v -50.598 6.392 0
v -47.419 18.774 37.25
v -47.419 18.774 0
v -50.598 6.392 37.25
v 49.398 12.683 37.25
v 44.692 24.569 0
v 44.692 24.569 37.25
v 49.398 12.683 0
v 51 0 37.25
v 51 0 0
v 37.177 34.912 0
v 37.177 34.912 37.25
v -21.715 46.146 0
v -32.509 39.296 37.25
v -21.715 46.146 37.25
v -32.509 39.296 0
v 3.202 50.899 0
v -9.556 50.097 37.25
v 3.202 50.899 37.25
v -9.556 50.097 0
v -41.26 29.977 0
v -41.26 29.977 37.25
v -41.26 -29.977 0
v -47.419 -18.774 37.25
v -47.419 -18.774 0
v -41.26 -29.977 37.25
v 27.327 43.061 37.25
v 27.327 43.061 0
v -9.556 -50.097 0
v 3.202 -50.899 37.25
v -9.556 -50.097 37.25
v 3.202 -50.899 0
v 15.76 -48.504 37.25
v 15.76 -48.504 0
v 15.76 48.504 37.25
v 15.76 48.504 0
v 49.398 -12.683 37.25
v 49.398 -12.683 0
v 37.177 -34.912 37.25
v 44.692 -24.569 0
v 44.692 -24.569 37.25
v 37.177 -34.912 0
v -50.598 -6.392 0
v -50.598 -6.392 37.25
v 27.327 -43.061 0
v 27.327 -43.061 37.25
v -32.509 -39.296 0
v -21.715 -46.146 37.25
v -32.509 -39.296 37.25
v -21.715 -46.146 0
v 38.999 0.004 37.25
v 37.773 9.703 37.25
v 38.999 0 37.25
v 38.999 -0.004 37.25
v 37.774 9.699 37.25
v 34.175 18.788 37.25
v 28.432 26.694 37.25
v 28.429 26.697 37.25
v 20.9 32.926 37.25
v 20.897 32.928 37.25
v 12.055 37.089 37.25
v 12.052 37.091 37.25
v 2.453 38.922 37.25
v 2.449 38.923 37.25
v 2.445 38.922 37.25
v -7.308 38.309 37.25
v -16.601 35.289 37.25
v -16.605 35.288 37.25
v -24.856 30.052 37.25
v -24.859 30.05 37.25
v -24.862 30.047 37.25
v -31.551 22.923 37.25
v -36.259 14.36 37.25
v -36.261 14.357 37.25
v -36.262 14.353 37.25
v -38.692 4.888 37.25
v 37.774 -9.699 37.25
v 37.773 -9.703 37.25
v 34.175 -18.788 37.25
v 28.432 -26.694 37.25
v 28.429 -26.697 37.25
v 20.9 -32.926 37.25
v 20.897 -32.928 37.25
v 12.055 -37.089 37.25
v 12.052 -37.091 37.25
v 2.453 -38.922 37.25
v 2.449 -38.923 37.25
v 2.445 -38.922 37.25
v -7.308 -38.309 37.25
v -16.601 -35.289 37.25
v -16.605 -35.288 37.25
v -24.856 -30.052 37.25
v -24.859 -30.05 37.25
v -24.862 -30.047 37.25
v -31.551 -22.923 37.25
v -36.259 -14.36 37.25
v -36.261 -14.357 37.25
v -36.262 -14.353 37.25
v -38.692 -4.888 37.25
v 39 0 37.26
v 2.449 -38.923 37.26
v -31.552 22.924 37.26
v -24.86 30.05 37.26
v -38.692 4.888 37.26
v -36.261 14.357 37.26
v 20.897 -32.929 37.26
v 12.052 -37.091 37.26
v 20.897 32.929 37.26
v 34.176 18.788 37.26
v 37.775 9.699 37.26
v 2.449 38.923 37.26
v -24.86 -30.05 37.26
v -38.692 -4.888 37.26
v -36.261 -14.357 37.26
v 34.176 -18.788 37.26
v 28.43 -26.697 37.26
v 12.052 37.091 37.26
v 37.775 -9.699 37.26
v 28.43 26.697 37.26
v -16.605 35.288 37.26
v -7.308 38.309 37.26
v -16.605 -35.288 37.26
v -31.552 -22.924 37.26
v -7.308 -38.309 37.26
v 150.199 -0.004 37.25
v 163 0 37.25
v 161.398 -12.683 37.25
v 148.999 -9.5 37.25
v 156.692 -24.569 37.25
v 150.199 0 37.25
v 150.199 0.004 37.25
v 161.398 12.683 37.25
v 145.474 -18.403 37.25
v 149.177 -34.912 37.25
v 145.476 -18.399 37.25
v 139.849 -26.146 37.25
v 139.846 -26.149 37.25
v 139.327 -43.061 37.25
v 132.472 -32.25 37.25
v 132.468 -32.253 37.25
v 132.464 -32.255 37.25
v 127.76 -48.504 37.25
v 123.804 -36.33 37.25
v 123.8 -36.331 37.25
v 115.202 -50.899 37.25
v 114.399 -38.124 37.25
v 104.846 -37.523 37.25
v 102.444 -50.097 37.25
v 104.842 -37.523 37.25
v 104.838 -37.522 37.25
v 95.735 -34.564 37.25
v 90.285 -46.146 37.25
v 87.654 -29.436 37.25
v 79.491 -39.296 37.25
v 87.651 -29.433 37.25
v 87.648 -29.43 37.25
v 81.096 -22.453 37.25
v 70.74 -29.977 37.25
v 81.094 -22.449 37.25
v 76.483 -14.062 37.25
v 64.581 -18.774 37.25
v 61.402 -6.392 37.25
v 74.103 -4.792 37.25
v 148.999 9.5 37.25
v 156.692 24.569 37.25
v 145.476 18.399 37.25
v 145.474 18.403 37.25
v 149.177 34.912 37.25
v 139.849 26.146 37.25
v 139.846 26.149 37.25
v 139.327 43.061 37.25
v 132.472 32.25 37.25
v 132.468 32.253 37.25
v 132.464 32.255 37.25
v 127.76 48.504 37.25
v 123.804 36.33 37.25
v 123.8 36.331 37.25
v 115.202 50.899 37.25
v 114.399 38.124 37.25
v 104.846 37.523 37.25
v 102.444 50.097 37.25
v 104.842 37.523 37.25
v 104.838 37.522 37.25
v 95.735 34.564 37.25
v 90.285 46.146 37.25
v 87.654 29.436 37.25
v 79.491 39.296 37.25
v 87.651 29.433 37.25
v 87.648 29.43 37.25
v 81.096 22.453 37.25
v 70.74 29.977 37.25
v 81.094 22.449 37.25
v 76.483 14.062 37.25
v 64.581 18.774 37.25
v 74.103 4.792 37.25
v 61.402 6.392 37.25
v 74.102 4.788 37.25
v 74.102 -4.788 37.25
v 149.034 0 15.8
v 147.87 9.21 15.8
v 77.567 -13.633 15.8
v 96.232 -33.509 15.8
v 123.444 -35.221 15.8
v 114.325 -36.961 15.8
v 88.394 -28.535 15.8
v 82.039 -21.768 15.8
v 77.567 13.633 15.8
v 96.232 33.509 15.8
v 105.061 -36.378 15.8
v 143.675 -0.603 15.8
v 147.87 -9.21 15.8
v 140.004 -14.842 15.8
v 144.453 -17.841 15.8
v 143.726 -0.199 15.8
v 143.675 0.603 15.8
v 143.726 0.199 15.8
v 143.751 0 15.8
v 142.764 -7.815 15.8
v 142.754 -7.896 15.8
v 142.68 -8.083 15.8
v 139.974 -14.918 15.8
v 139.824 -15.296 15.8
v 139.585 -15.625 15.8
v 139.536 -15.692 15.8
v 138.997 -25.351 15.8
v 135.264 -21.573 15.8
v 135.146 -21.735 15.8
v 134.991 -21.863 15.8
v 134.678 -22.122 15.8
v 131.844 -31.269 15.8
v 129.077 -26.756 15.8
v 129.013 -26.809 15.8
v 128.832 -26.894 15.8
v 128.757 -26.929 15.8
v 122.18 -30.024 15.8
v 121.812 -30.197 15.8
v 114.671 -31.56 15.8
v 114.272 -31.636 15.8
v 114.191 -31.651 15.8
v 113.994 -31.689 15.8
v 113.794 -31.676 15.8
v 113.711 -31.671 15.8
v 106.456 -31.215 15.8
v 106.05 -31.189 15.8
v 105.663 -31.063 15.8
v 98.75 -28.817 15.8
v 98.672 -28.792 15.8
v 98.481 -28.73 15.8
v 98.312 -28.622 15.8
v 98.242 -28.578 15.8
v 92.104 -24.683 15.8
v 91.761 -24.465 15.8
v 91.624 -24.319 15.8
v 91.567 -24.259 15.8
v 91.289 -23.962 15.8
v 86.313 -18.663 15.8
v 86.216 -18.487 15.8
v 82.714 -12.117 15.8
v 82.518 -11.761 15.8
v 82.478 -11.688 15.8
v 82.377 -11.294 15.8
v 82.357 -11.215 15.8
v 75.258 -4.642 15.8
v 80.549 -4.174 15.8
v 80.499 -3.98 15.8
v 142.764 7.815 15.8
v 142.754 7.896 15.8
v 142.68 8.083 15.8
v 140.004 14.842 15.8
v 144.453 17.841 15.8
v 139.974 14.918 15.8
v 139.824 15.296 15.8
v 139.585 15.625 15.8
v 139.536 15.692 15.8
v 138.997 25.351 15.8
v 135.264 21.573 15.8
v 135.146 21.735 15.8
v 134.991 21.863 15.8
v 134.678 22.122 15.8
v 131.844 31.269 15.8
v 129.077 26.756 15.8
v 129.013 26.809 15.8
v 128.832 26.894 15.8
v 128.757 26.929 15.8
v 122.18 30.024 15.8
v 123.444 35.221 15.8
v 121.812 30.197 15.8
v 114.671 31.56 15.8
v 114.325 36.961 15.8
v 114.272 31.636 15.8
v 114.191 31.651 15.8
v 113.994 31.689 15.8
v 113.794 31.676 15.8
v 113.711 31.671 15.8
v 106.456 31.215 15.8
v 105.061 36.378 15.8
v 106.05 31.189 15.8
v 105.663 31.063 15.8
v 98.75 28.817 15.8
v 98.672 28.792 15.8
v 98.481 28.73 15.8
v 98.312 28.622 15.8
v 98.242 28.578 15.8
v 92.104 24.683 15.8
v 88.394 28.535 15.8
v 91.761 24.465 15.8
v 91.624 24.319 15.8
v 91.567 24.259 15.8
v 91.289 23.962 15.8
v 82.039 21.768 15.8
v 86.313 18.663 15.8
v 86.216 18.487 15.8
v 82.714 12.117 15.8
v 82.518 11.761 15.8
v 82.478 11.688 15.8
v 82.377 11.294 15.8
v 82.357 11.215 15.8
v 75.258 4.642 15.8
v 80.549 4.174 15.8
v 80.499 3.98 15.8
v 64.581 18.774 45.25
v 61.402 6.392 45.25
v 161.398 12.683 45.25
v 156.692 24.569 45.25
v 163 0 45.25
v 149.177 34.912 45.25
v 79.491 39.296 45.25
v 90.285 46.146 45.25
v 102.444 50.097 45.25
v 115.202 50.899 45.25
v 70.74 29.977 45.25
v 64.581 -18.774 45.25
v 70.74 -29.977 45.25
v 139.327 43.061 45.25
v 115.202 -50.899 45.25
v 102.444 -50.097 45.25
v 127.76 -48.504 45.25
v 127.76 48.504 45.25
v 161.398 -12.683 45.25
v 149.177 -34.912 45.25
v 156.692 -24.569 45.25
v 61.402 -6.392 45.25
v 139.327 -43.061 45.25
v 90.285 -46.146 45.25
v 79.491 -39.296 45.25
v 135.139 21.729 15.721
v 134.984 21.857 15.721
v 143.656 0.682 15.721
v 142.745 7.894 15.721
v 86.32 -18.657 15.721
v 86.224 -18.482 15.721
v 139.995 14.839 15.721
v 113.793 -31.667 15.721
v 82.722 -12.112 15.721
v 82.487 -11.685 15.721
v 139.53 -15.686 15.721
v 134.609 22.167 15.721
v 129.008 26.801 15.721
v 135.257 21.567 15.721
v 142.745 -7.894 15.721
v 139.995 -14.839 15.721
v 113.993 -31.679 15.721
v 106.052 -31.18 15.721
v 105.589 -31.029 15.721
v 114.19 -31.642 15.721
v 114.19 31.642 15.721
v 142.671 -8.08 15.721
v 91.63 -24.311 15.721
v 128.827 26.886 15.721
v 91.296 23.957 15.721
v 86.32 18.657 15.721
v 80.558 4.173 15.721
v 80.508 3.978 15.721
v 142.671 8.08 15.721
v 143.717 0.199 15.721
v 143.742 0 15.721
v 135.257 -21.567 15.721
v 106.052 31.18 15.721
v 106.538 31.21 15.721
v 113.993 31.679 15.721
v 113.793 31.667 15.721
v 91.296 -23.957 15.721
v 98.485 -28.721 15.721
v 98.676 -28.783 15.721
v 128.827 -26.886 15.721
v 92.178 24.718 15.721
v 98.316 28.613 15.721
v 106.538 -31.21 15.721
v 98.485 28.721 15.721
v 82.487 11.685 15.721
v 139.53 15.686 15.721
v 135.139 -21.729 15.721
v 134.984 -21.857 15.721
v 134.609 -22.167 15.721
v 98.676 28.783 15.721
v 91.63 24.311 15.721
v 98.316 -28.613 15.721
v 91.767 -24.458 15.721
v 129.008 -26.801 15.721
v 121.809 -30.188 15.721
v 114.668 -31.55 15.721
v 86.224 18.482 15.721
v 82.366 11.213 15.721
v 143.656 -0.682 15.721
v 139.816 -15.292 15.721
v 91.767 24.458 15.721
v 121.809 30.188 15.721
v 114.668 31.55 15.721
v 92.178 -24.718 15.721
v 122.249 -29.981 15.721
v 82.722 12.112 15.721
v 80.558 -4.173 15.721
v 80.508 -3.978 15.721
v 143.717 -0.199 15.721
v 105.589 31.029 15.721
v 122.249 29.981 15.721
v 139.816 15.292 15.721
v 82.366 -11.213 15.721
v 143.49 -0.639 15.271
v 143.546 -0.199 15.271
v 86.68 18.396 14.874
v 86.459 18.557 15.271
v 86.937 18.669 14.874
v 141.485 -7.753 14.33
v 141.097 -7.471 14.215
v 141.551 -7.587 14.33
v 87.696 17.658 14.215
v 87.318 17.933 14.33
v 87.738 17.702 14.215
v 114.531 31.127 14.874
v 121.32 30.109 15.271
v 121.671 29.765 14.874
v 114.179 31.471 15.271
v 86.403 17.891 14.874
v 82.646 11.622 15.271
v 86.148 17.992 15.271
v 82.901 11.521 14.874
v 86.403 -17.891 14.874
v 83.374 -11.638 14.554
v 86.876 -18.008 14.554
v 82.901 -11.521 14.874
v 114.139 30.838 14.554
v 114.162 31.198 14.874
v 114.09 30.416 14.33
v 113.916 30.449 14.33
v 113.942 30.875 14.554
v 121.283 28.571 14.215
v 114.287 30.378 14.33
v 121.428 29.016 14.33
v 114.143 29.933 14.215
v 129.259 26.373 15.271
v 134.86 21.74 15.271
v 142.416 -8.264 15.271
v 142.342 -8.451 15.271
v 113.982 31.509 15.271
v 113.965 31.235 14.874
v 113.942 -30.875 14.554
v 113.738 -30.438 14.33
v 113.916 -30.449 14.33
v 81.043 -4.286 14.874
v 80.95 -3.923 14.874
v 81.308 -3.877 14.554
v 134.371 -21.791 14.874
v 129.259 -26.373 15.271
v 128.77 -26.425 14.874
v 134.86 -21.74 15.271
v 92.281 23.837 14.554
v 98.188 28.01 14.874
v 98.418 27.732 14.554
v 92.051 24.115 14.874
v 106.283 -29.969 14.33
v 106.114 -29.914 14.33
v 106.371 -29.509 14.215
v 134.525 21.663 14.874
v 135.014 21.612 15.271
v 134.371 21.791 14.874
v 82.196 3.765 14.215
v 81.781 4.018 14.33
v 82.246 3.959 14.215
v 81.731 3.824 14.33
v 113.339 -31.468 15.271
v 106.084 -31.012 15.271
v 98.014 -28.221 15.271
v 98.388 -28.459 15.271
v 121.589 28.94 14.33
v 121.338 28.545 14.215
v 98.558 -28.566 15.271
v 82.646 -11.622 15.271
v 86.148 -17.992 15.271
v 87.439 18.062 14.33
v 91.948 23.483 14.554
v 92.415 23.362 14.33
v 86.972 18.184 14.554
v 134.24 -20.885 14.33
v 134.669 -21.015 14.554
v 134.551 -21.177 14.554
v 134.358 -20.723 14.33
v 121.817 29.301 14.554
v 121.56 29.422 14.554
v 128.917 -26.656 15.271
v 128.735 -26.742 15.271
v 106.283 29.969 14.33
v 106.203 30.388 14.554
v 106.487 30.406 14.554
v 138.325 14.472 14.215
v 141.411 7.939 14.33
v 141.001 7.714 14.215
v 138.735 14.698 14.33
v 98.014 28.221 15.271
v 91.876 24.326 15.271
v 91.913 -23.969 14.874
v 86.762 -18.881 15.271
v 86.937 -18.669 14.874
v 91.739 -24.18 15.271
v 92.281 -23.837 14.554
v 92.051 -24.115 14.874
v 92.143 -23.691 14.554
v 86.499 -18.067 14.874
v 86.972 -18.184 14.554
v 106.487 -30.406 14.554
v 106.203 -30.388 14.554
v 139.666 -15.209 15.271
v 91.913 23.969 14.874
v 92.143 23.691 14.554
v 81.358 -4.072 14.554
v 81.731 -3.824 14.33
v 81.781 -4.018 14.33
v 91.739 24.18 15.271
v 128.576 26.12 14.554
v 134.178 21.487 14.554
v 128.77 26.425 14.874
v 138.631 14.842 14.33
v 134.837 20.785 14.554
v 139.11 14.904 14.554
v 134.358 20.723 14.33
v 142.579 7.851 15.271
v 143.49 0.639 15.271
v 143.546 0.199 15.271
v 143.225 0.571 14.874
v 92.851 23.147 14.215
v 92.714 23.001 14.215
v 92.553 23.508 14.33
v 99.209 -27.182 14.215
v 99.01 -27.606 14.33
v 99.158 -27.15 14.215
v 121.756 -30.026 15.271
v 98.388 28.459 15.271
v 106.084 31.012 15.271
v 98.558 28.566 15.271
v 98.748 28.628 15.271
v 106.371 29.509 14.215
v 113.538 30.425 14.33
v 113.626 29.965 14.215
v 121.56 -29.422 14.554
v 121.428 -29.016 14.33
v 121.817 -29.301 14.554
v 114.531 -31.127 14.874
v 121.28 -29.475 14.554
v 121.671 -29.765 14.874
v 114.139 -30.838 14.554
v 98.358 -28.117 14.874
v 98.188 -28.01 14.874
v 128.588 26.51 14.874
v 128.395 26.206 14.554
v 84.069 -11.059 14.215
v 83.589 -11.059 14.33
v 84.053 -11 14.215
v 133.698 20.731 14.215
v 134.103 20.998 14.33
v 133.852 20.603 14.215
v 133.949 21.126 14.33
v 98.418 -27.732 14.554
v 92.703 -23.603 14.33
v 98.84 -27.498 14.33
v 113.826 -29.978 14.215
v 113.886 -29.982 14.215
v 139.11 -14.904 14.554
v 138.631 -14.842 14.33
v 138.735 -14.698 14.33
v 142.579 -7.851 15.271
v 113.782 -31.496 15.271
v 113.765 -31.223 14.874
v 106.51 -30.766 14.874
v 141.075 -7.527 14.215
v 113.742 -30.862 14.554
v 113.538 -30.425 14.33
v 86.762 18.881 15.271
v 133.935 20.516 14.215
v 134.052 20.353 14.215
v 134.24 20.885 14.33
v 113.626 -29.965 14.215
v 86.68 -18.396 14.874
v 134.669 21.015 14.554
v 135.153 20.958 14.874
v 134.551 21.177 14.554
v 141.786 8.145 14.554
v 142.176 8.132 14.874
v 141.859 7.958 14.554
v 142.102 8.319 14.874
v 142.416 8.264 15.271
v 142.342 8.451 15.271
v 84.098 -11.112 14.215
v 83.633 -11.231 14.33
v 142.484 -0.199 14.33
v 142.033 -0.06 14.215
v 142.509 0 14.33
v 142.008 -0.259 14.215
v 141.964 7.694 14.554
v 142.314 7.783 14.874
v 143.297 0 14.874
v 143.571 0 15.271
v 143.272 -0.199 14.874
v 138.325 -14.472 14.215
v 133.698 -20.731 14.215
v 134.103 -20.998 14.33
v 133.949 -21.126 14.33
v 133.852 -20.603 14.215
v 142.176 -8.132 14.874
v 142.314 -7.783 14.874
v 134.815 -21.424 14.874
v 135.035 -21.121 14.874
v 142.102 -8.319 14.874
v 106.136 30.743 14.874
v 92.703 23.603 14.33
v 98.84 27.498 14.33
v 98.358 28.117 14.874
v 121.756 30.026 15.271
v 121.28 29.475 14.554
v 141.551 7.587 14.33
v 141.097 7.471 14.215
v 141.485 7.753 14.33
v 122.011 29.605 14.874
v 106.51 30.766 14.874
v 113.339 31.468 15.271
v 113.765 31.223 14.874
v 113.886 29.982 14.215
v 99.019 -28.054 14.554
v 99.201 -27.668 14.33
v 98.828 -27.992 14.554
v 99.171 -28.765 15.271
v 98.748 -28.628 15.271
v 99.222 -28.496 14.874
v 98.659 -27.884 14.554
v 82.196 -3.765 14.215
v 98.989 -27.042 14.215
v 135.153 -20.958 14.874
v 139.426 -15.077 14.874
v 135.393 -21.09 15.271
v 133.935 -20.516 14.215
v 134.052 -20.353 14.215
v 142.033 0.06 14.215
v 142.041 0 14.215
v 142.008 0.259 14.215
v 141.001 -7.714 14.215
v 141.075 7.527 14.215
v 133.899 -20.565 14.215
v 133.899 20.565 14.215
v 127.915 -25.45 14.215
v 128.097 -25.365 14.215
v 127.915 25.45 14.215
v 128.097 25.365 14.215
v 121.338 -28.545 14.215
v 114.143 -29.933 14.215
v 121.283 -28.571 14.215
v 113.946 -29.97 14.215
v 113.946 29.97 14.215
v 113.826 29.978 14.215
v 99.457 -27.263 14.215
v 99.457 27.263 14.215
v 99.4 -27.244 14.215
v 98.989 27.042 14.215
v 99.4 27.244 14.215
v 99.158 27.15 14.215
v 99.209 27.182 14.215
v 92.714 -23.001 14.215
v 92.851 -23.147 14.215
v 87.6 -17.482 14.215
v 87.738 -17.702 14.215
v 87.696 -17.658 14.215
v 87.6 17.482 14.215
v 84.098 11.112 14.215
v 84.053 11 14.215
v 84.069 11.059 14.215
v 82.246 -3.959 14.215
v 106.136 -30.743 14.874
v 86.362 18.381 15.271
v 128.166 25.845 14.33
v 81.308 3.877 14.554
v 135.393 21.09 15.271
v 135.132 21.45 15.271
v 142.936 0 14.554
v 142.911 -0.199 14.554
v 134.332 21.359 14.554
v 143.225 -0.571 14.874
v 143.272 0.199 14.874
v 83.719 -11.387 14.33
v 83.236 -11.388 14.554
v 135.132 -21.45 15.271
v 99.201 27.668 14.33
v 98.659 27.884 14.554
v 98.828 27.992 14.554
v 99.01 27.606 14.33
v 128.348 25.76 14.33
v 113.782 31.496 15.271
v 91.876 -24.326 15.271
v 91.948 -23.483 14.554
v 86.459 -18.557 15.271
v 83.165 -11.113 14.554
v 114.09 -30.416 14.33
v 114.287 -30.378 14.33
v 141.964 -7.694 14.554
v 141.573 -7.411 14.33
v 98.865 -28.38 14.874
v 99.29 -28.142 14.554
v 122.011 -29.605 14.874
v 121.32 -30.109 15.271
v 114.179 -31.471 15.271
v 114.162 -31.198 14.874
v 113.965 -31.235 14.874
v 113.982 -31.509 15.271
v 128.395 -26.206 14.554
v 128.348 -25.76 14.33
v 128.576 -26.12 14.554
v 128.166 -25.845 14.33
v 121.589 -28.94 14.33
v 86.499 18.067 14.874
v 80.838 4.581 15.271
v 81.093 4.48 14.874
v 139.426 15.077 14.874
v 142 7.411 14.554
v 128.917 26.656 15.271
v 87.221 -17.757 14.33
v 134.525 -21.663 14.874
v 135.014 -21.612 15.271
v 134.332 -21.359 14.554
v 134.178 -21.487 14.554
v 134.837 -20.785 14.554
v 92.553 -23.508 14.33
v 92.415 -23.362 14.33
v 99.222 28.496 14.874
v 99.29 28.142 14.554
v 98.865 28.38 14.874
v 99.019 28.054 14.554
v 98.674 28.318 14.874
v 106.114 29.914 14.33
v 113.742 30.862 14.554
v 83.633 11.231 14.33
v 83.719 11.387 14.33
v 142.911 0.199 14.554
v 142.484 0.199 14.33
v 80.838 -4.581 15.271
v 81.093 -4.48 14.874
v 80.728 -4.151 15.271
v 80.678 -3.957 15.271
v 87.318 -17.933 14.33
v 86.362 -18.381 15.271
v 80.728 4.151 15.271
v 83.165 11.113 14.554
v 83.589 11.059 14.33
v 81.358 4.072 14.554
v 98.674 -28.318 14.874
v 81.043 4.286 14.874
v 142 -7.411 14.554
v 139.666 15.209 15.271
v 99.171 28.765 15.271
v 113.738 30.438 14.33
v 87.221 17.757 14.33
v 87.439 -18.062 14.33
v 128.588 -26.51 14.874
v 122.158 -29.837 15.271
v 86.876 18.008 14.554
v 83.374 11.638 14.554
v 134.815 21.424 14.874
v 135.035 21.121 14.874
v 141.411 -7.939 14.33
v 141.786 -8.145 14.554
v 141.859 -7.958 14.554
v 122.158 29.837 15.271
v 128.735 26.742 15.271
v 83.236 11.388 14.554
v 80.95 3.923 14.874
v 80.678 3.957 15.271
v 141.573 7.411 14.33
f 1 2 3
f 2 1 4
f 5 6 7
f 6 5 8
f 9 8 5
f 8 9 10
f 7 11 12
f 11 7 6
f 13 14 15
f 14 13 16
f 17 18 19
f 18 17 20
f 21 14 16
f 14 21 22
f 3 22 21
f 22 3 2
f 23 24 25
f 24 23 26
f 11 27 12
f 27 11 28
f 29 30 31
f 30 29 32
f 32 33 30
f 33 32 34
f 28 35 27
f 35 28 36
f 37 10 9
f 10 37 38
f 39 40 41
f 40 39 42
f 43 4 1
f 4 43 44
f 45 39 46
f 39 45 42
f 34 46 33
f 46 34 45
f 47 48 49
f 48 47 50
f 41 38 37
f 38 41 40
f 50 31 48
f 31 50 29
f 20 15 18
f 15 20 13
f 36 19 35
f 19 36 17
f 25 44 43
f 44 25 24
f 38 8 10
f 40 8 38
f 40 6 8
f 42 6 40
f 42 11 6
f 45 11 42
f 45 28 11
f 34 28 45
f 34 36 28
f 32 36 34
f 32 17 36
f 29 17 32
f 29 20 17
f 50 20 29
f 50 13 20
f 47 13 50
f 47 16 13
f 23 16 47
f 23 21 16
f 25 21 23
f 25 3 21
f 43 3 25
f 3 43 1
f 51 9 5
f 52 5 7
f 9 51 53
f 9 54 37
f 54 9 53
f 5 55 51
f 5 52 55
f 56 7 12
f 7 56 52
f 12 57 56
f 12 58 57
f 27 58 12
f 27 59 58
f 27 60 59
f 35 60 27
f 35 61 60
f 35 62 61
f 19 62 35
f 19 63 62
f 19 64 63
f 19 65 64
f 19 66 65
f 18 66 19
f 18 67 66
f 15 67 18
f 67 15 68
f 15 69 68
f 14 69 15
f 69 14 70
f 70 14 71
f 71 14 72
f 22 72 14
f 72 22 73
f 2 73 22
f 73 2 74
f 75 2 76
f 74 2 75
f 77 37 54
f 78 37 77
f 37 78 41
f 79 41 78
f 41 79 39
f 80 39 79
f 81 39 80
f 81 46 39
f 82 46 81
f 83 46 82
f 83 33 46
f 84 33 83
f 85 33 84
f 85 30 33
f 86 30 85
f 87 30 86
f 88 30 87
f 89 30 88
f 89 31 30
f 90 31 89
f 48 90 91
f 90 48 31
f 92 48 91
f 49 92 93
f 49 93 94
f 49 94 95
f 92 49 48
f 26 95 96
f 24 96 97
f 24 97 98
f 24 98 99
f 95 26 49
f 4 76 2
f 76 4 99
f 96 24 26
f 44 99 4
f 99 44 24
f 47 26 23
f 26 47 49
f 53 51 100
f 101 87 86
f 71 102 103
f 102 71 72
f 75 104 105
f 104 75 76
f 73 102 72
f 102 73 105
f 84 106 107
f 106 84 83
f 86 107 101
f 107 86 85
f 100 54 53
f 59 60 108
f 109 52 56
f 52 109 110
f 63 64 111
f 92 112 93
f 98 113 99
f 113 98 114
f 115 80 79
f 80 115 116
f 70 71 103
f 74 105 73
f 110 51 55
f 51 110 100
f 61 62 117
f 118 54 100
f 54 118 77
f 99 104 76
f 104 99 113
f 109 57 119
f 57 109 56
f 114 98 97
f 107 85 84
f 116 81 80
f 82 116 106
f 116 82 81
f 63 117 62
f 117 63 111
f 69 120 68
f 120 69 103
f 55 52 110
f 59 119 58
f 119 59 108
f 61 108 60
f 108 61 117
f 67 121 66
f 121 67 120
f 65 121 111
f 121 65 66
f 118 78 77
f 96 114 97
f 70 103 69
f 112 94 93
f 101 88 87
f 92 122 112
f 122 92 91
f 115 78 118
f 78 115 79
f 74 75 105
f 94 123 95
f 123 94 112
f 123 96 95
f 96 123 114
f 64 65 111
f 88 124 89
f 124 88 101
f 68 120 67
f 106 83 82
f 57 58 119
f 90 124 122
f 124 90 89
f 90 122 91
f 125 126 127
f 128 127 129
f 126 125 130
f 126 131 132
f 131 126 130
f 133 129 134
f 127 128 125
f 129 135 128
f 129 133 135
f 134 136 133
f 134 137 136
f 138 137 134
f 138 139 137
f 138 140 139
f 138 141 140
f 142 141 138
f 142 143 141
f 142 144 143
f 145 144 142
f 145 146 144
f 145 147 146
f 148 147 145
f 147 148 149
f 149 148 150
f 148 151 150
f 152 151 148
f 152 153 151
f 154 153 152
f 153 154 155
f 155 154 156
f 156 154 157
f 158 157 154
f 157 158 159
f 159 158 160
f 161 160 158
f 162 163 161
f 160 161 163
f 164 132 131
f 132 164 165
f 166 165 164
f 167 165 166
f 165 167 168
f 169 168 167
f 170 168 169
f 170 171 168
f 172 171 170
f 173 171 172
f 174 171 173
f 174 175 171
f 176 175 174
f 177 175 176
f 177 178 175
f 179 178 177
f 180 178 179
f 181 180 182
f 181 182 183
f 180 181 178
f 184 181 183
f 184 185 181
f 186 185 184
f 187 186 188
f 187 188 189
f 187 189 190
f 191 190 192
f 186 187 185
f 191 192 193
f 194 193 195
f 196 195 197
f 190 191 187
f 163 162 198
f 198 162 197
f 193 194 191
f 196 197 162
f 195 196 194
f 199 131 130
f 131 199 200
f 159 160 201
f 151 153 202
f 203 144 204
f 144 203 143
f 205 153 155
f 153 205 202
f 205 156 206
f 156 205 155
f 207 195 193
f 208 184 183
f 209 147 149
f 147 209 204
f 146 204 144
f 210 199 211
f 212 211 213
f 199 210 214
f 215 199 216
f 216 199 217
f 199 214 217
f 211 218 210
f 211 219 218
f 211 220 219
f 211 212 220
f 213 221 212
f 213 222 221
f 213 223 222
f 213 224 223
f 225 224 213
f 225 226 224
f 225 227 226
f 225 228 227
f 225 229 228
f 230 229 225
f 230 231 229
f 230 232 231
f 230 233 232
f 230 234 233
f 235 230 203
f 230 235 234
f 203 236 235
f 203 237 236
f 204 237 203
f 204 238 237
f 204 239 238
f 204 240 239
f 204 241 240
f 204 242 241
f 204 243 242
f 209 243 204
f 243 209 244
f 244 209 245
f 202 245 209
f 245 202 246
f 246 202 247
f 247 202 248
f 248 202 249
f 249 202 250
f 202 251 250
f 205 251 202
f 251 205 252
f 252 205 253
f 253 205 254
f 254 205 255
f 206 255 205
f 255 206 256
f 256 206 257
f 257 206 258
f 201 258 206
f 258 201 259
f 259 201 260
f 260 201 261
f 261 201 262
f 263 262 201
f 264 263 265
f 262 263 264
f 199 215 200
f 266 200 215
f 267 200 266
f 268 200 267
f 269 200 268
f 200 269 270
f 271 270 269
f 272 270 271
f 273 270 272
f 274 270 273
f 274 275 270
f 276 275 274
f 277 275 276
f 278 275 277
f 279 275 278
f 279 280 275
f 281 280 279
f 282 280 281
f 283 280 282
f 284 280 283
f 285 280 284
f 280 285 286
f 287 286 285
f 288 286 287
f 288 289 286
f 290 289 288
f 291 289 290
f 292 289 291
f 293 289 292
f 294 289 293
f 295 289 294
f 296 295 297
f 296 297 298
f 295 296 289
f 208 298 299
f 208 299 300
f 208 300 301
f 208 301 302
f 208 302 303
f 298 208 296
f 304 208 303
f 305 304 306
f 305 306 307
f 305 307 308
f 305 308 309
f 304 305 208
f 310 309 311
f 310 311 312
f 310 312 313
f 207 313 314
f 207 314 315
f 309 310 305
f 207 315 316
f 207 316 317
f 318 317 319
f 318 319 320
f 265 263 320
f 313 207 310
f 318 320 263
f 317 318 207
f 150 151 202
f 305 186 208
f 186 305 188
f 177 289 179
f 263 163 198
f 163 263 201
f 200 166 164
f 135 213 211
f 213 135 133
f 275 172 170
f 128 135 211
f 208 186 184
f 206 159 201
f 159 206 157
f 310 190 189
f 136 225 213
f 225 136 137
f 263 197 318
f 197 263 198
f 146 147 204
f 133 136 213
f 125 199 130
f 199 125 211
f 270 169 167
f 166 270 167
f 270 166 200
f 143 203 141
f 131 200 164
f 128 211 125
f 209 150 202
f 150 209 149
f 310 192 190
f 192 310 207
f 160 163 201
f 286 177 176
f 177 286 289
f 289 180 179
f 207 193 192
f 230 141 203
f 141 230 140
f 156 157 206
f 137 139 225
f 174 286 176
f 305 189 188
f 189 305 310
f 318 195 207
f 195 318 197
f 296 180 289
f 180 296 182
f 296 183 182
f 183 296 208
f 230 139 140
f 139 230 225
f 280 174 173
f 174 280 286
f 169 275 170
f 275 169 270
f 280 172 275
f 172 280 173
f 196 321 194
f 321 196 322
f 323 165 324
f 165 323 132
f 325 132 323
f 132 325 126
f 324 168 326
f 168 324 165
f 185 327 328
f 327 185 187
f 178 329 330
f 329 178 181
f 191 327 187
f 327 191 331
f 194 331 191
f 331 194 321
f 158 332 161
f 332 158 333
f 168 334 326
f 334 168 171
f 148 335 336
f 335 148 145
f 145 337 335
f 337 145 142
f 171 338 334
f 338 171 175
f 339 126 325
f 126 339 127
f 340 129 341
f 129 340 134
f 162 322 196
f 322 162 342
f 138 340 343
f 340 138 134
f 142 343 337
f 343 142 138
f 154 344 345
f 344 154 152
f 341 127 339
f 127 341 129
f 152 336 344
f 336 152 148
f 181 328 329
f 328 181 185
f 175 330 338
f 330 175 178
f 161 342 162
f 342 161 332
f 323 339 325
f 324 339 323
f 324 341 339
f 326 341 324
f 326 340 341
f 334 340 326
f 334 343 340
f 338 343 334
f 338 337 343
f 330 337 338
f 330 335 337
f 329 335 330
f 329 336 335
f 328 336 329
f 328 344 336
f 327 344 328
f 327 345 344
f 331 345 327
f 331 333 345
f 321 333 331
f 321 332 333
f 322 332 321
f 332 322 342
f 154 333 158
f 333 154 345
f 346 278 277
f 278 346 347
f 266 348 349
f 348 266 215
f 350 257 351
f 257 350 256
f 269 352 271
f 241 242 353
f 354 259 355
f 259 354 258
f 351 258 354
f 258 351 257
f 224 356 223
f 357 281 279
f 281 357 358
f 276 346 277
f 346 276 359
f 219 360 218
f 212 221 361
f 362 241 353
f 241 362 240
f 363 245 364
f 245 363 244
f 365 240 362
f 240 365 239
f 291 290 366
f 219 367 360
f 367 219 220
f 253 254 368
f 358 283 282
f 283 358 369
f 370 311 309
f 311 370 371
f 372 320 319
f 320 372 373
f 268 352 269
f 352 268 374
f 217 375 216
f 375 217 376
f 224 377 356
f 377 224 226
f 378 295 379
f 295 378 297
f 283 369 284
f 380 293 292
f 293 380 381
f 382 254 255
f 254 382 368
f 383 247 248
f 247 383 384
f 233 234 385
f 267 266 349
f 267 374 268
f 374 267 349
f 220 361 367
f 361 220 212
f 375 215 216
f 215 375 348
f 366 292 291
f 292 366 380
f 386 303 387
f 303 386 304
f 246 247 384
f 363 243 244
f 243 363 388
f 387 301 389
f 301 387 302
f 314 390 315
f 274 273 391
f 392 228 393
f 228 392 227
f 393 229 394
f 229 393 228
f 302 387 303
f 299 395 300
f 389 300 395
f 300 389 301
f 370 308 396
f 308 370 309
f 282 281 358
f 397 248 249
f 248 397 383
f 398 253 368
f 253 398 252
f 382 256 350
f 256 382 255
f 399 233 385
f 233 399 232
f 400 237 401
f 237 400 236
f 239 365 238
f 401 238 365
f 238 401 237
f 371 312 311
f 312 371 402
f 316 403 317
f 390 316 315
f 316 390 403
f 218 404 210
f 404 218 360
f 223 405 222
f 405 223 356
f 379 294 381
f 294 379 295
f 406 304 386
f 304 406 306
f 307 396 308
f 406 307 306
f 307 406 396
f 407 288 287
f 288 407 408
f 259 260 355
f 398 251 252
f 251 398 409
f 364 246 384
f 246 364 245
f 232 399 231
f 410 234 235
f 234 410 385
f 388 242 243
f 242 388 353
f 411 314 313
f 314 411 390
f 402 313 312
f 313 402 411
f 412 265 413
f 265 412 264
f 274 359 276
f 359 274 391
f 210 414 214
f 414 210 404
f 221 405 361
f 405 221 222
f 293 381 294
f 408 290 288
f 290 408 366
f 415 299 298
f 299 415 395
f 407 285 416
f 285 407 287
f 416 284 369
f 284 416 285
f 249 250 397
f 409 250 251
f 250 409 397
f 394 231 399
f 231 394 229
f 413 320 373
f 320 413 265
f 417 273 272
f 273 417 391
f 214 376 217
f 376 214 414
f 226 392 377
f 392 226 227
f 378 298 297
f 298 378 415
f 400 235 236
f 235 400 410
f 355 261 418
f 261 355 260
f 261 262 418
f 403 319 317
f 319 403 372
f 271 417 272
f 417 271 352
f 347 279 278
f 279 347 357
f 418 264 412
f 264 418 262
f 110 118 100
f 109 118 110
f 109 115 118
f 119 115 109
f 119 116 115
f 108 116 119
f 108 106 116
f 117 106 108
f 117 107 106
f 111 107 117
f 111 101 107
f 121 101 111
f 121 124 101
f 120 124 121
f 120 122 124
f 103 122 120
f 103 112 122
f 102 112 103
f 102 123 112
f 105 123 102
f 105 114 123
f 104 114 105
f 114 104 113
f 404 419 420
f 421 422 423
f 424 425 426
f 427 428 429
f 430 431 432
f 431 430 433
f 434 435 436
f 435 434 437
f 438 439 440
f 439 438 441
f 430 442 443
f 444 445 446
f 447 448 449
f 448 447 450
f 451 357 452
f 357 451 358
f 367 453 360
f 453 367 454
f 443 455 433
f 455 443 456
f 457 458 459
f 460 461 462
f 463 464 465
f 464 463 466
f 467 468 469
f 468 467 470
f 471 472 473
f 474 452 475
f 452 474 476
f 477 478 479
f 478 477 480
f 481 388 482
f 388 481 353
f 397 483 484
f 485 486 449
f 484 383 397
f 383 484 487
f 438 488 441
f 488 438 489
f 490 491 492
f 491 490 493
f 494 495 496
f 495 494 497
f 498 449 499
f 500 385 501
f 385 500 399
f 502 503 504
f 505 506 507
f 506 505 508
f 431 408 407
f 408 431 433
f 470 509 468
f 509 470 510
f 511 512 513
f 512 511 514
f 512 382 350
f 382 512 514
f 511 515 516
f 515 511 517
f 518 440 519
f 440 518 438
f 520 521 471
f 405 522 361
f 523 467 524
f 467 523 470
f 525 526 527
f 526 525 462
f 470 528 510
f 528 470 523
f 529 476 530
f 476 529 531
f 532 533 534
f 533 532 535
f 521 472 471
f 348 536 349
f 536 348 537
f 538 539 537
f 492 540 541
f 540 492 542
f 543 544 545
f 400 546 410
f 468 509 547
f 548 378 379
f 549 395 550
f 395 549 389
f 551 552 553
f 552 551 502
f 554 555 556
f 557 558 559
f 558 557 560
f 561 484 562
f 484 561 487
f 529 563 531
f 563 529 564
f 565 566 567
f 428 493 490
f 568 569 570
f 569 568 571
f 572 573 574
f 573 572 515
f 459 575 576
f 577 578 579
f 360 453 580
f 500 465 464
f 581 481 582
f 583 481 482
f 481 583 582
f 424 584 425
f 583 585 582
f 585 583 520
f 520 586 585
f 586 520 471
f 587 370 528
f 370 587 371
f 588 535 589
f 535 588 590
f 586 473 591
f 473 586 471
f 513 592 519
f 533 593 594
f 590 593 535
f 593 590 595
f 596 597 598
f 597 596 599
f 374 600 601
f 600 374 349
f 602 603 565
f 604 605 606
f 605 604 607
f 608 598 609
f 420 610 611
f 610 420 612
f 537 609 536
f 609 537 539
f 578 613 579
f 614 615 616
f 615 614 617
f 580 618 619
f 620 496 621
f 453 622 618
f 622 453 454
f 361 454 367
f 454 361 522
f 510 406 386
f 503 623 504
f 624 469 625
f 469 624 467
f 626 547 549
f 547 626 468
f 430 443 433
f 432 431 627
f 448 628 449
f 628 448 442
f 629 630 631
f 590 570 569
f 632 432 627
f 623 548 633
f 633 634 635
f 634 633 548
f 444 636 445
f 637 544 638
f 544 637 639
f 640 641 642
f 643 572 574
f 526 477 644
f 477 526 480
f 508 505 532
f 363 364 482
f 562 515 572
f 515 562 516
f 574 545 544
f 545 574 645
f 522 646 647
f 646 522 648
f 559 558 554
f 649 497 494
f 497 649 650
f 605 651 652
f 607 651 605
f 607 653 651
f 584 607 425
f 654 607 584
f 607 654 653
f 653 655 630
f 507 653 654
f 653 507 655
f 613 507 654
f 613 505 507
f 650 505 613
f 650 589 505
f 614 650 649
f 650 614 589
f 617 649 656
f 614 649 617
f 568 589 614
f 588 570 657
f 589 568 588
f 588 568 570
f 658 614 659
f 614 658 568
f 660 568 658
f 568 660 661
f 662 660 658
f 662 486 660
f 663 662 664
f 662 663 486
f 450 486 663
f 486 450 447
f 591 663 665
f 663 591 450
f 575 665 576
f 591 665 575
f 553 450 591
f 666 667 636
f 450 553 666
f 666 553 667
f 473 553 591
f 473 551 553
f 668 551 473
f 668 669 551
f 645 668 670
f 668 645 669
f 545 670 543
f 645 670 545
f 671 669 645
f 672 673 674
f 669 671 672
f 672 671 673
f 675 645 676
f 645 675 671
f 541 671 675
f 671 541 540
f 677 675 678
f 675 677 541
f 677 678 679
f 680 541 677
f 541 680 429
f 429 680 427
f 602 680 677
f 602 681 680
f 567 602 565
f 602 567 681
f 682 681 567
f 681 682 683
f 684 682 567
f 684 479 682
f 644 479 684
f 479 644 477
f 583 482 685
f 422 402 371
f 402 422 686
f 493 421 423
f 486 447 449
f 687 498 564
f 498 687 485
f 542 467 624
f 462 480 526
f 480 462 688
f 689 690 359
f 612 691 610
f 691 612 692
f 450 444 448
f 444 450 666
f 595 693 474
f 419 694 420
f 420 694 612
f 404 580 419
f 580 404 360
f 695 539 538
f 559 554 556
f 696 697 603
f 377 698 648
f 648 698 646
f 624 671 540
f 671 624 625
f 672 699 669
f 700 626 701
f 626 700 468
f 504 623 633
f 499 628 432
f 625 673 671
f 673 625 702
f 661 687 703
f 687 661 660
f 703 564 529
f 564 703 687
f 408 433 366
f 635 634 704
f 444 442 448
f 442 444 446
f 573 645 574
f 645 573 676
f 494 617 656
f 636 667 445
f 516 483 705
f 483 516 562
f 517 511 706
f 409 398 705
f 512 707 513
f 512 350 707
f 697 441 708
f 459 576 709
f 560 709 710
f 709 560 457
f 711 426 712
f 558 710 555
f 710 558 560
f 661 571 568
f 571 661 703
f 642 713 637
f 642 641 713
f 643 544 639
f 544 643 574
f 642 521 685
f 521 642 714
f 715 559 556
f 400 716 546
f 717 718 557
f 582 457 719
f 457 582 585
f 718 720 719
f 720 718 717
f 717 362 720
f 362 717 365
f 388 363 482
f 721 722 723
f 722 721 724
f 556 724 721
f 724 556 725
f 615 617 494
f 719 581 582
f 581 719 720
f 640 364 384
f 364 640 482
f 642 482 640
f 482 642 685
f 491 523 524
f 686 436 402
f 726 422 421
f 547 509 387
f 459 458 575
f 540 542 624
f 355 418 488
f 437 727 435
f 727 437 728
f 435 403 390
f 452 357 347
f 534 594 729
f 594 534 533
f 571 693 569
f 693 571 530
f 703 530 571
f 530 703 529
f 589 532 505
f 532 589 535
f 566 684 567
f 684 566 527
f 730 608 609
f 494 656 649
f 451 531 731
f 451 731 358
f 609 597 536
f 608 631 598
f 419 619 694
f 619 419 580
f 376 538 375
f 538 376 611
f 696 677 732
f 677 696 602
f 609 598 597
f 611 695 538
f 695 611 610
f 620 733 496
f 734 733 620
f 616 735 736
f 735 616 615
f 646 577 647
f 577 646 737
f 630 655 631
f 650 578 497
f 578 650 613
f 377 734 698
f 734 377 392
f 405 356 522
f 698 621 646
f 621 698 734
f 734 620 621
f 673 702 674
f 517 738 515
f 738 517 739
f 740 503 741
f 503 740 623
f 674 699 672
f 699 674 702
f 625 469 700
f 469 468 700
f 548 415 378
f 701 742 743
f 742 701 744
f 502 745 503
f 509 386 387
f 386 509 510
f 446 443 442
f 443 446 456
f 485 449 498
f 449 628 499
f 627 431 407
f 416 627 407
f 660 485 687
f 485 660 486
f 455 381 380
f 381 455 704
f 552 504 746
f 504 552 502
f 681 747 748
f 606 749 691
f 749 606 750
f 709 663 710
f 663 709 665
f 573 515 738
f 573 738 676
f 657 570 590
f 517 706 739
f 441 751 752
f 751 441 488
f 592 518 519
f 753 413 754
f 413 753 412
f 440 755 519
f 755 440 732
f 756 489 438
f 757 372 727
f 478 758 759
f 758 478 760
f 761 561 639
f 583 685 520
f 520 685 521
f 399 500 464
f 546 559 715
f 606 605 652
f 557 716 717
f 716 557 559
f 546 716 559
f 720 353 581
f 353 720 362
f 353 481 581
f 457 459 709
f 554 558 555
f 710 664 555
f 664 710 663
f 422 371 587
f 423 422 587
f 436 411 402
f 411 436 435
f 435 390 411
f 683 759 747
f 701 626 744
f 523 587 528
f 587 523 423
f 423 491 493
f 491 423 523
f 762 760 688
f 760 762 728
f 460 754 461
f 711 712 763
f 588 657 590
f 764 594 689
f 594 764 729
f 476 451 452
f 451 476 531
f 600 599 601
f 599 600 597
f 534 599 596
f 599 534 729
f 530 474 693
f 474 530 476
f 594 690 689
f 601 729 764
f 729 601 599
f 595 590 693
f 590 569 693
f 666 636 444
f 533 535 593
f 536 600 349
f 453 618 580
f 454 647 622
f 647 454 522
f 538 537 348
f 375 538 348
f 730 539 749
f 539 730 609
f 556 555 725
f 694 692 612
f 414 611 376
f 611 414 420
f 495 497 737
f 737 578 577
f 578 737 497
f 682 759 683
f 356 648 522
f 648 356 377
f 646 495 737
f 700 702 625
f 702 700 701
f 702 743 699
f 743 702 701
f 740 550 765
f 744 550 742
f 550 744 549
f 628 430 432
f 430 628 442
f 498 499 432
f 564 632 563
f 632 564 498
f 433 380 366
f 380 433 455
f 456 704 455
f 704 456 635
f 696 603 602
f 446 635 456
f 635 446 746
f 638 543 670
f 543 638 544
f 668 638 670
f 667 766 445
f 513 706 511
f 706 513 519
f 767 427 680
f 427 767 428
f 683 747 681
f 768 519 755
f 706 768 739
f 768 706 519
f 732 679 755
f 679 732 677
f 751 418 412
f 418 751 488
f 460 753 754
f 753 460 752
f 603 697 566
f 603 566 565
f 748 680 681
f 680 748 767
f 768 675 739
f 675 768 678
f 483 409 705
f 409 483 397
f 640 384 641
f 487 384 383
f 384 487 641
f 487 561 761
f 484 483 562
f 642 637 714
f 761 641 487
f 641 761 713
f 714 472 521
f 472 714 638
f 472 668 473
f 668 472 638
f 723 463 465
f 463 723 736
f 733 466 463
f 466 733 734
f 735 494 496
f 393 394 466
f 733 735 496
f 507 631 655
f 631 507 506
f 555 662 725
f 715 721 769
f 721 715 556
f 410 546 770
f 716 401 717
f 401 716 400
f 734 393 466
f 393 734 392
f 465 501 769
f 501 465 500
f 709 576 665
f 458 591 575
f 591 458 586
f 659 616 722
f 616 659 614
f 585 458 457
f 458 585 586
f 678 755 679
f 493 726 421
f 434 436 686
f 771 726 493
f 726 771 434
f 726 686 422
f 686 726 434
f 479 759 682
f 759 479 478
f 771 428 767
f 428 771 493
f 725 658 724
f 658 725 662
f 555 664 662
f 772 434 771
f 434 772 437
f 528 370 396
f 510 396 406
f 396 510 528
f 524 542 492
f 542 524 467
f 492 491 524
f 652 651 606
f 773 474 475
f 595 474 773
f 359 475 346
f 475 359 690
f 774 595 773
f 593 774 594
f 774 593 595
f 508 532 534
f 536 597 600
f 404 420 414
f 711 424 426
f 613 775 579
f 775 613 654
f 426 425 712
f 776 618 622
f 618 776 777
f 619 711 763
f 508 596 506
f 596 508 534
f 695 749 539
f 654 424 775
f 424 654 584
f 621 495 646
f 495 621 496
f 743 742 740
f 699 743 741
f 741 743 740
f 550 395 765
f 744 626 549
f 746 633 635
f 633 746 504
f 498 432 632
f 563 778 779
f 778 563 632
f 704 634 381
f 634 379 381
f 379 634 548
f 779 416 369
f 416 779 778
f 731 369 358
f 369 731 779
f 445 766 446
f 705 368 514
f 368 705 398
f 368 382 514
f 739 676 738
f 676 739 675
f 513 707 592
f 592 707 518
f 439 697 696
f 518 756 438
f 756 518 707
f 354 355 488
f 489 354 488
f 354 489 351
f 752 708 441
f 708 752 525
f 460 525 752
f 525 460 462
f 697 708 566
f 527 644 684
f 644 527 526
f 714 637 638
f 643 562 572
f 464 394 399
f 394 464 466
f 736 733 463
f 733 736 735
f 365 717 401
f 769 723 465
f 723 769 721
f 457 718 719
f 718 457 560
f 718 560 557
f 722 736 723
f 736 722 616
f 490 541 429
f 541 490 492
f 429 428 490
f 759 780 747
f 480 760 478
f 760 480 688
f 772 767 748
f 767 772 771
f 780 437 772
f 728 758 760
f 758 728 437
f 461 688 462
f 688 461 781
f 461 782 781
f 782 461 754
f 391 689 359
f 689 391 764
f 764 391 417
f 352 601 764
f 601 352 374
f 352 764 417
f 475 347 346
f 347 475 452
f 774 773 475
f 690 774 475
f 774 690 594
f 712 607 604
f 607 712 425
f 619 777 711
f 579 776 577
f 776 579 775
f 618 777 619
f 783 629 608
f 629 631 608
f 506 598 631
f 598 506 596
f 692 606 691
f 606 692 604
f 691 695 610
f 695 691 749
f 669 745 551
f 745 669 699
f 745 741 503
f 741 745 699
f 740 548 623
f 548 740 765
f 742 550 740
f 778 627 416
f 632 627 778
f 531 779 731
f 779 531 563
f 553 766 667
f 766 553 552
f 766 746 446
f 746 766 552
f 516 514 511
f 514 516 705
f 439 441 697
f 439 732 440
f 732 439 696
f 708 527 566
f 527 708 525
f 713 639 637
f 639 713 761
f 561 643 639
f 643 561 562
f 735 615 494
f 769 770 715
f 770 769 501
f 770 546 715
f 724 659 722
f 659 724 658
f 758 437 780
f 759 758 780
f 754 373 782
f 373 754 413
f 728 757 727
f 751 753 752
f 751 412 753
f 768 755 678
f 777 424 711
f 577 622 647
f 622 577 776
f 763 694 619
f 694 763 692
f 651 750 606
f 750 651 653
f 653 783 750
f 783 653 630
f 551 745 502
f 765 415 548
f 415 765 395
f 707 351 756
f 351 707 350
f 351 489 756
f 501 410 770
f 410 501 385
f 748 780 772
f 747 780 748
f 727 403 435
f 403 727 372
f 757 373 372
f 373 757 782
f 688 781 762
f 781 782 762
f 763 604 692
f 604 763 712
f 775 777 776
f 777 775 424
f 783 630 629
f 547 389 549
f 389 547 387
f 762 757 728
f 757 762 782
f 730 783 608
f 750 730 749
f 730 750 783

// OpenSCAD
// file: common.scad
// Easy Button style case for the rev1 single-button board. All white.
//
// Three printable parts: base, button, clamp.
// Origin is the PCB center. +Y is USB. +Z is the button face.
// z = 0 is the outside of the base floor.
//
// OBJ mesh units are 0.254 mm. The PCB is about 40.5 x 43.9 mm and its
// corners sit at r ≈ 28.3 mm. The switch is dead center. The XIAO is on
// the back at the USB end (about y = 2 to 23).
//
// The cell's long side runs along X, same direction as the PCB width.
// outer_r is 32. The board, module, and battery are shifted toward USB
// only as far as that circle allows. The USB cut is a tunnel out through
// the wall.

// Body
outer_r = 31;
// Board and module, toward USB from the switch. The USB end needs wall left.
stack_y = 6;
floor_t = 1.5;
pcb_t = 1.6;
pcb_gap = 0.45;

// Battery
// 38 mm across the PCB width, 25 mm toward the tail of the board, plus wiggle.
battery_x = 38.0;
battery_y = 25.1;
battery_top = -0.01;    // Slight overlap to eliminate the wall between the battery and the module
battery_d = 8;     // under the PCB; 8 mm cell plus clearance

// XIAO
xiao_w = 20;
xiao_body_y0 = 0;
xiao_body_y1 = 22.4;
xiao_usb_w = 12.0;
xiao_usb_y1 = 23.3;
xiao_d = 3.5;

// Button
switch_h = 1.8;
tip_gap = 0.35;
tip_d = 4;
tip_straight = 1.6;
travel = 1.0;
flange_r = 26.0;
flange_t = 1.25;
face_r = 23.0;
face_h = 3.4;         // flat top, stands proud of the clamp lip
opening_r = 23.15;     // clamp hole the face passes through

// Clamp
lip_t = 1.8;
screw_r = 27;      // head stays inside outer_r, shaft stays outside the flange
screw_angles = [-210, 270, -330];
screw_clear_d = 3.3;
screw_pilot_d = 3;
screw_pilot_h = 8.0;
screw_head_d = 5.4;
screw_head_h = 1.5;

// USB
// Tunnel from the connector (inside the circle) out through the wall.
usb_w = 10.0;
usb_h = 5.0;
usb_drop = 2.35;
usb_y0 = 12;

eps = 0.05;

// --- derived ---
pcb_z = floor_t + battery_d;
pcb_top = pcb_z + pcb_t;
switch_top = pcb_top + switch_h;
tip_rest = switch_top + tip_gap;
seat_z = tip_rest - travel;
lip_z = flange_t + travel;                 // lip underside, relative to the clamp bottom
clamp_h = lip_z + lip_t;
flange_clear_r = flange_r + 0.55;

board_pts = [
  [-17.78, -21.95],
  [ 17.91, -21.95],
  [ 20.23, -19.55],
  [ 20.18,  10.67],
  [  8.89,  21.95],
  [ -9.02,  21.95],
  [-20.23,  10.67],
  [-20.15, -19.55]
];

module board_2d() {
  translate([0, stack_y])
    polygon(board_pts);
}

module battery_2d() {
  // +Y edge sits battery_top below the module.
  translate([0, stack_y - battery_top - battery_y / 2])
    square([battery_x, battery_y], center = true);
}

module xiao_2d() {
  translate([0, stack_y]) {
    translate([0, (xiao_body_y0 + xiao_body_y1) / 2])
      square([xiao_w, xiao_body_y1 - xiao_body_y0], center = true);
    translate([0, (xiao_body_y1 - 1.2 + xiao_usb_y1) / 2])
      square([xiao_usb_w, xiao_usb_y1 - (xiao_body_y1 - 1.2)], center = true);
  }
}

module base() {
  difference() {
    base_body();
    translate([0, 0, floor_t])
      linear_extrude(battery_d + eps + 10) //extrude all the way out
        battery_2d();
    translate([0, 0, pcb_z - xiao_d])
      linear_extrude(xiao_d + eps)
        xiao_2d();
    translate([0, 0, pcb_z])
      linear_extrude(seat_z - pcb_z + eps)
        offset(delta = pcb_gap) board_2d();
    usb_tunnel();
    wire_notch();
    screw_pilots();
  }
  pcb_tabs();
}

// Press the board past these. They keep it from falling out when the cap is off.
module pcb_tabs() {
  z0 = pcb_top + 0.35;
  h = 0.75;
  translate([-21.6, stack_y - 5, z0]) cube([1.8, 10, h]);
  translate([19.8, stack_y - 5, z0]) cube([1.8, 10, h]);
}

module usb_tunnel() {
  cz = pcb_z - usb_drop;
  translate([-usb_w / 2, usb_y0 + stack_y, cz - usb_h / 2])
    cube([usb_w, outer_r - (usb_y0 + stack_y) + 2, usb_h]);
}

module wire_notch() {
  translate([13, stack_y - 3, pcb_z - 8])
    cube([6, 15, 8 + eps]);
}

module screw_pilots() {
  for (a = screw_angles)
    rotate([0, 0, a])
      translate([screw_r, 0, seat_z - screw_pilot_h])
        cylinder(d = screw_pilot_d, h = screw_pilot_h + eps);
}

// Outer wall. The bottom edge is a quarter-round of radius rad.
module base_body() {
  rad = 2;
  minkowski() {
    translate([0, 0, rad])
      cylinder(r = outer_r - rad, h = seat_z - rad);
    difference() {
      sphere(r = rad);
      translate([-rad * 2, -rad * 2, 0])
        cube([rad * 4, rad * 4, rad * 2]);
    }
  }
}

module clamp() {
  difference() {
    union() {
      cylinder(r = outer_r, h = clamp_h);
    }
    // Below the lip the flange has to move.
    translate([0, 0, -eps])
      difference() {
        cylinder(r = flange_clear_r, h = lip_z + eps);
        // Cut out alignment pin so it doesnt difference
        for (a = screw_angles)
          rotate([0, 0, a])
            translate([screw_r, 0, 0]) {
              translate([0, 0, -eps])
                cylinder(d = screw_clear_d+4, h = clamp_h);
            }
      }
    // Opening the face comes through.
    translate([0, 0, lip_z - eps])
      cylinder(r = opening_r, h = lip_t + 2 * eps);
    screw_clearance();
  }
}

module screw_clearance() {
  for (a = screw_angles)
    rotate([0, 0, a])
      translate([screw_r, 0, 0]) {
        translate([0, 0, -eps])
          cylinder(d = screw_clear_d, h = clamp_h + 2 * eps);
        // Head sits on the top face, the same face as the lip.
        translate([0, 0, clamp_h - screw_head_h])
          cylinder(d = screw_head_d, h = screw_head_h + eps);
      }
}

module button() {
  union() {
    translate([0, 0, tip_rest])
      cylinder(r = flange_r, h = flange_t);
    translate([0, 0, tip_rest + flange_t - eps])
      cylinder(r = face_r, h = face_h);
    translate([0, 0, tip_rest])
      cylinder(d = tip_d, h = tip_straight + eps);
    translate([0, 0, tip_rest + tip_straight])
      cylinder(d = tip_d, h = tip_rest - tip_rest - tip_straight + eps);
  }
}

module button_solid() {
  difference() {
    button();
    led_opening();
    for (a = screw_angles)
      rotate([0, 0, a])
        translate([screw_r, 0, 0]) {
          translate([0, 0, -eps])
            cylinder(d = screw_clear_d+4.5, h = 15);
        }
  }
}

module led_opening() {
  translate([0, 0, -5.75])
    cylinder(d = 40, h = 20);
}

module pcb_ghost() {
  translate([0, 0, pcb_z])
    linear_extrude(pcb_t)
      board_2d();
}

module battery_ghost() {
  translate([0, 0, floor_t + 0.4])
    linear_extrude(battery_d - 2.2)
      offset(delta = -0.7) battery_2d();
}

module xiao_ghost() {
  translate([0, 0, pcb_z - xiao_d + 0.35])
    linear_extrude(xiao_d - 0.7)
      offset(delta = -0.4) xiao_2d();
}

echo(str("seat ", seat_z, "  clamp ", seat_z, " to ", seat_z + clamp_h));
echo(str("battery ", battery_x, " x ", battery_y, "  top y ", battery_top));
echo(str("outer d ", outer_r * 2, "  face d ", face_r * 2));
// main file
// Two-piece mold for stamping sheet packaging around base_body().
// Blank cylinder, cup cut splits the halves (draft taper), hump nests the product.
//   openscad -o mold.stl mold.scad
include <common.scad>

$fn = 25;

mold_r = outer_r + 20;
mold_h = seat_z + 25;
cup_clear = 8;
draft_deg = 3;
cup_h = seat_z + 10;
cup_r_top = outer_r + cup_clear;
cup_r_bot = cup_r_top - cup_h * tan(draft_deg);
cup_z = mold_h - cup_h;
sheet_thickness = 0.8;
clamp_base_t = 8;  // wide flange on the upper for clamping
visual_move = 10;  // space the halves apart in preview
// avoid z-fighting
fudge = 0.01;

module blank() {
  cylinder(r = mold_r, h = mold_h);
}

// Parting volume. Wider at the open (top) end for draft.
// gap insets the male by sheet_thickness in radius and height.
module cup(gap = 0) {
  translate([0, 0, cup_z + gap])
    cylinder(
      r1 = cup_r_bot - gap,
      r2 = cup_r_top - gap,
      h = cup_h - gap + fudge
    );
}

// Raised form the sheet wraps over so base_body() sits in the stamped nest.
// gap expands the clearance volume by sheet_thickness (radius + height).
module hump(gap = 0) {
  translate([0, 0, cup_z - gap])
    if (gap > 0)
      minkowski() {
        base_body();
        cylinder(r = gap, h = fudge);
      }
    else
      base_body();
}

// Female die: blank minus cup, plus the product hump on the cup floor.
module mold_lower() {
  difference() {
    blank();
    cup();
  }
  hump();
}

// Male punch: cup plug shrunk by sheet_thickness, cleared for hump + sheet.
// Wide base matches lower OD so the halves can be clamped.
module mold_upper() {
  difference() {
    union() {
      intersection() {
        blank();
        cup(sheet_thickness);
      }
      // Wide clamp base. Same OD as the lower mold.
      translate([0, 0, mold_h])
        cylinder(r = mold_r, h = clamp_base_t);
    }
    hump(sheet_thickness);
  }
}

color("burlywood")
  mold_lower();
color("red", 0.4)
  cup();

color("burlywood")
  translate([2 * mold_r + visual_move, 0, 0])
    mold_upper();
color("red", 0.4)
  translate([2 * mold_r + visual_move, 0, 0])
    hump(sheet_thickness);
